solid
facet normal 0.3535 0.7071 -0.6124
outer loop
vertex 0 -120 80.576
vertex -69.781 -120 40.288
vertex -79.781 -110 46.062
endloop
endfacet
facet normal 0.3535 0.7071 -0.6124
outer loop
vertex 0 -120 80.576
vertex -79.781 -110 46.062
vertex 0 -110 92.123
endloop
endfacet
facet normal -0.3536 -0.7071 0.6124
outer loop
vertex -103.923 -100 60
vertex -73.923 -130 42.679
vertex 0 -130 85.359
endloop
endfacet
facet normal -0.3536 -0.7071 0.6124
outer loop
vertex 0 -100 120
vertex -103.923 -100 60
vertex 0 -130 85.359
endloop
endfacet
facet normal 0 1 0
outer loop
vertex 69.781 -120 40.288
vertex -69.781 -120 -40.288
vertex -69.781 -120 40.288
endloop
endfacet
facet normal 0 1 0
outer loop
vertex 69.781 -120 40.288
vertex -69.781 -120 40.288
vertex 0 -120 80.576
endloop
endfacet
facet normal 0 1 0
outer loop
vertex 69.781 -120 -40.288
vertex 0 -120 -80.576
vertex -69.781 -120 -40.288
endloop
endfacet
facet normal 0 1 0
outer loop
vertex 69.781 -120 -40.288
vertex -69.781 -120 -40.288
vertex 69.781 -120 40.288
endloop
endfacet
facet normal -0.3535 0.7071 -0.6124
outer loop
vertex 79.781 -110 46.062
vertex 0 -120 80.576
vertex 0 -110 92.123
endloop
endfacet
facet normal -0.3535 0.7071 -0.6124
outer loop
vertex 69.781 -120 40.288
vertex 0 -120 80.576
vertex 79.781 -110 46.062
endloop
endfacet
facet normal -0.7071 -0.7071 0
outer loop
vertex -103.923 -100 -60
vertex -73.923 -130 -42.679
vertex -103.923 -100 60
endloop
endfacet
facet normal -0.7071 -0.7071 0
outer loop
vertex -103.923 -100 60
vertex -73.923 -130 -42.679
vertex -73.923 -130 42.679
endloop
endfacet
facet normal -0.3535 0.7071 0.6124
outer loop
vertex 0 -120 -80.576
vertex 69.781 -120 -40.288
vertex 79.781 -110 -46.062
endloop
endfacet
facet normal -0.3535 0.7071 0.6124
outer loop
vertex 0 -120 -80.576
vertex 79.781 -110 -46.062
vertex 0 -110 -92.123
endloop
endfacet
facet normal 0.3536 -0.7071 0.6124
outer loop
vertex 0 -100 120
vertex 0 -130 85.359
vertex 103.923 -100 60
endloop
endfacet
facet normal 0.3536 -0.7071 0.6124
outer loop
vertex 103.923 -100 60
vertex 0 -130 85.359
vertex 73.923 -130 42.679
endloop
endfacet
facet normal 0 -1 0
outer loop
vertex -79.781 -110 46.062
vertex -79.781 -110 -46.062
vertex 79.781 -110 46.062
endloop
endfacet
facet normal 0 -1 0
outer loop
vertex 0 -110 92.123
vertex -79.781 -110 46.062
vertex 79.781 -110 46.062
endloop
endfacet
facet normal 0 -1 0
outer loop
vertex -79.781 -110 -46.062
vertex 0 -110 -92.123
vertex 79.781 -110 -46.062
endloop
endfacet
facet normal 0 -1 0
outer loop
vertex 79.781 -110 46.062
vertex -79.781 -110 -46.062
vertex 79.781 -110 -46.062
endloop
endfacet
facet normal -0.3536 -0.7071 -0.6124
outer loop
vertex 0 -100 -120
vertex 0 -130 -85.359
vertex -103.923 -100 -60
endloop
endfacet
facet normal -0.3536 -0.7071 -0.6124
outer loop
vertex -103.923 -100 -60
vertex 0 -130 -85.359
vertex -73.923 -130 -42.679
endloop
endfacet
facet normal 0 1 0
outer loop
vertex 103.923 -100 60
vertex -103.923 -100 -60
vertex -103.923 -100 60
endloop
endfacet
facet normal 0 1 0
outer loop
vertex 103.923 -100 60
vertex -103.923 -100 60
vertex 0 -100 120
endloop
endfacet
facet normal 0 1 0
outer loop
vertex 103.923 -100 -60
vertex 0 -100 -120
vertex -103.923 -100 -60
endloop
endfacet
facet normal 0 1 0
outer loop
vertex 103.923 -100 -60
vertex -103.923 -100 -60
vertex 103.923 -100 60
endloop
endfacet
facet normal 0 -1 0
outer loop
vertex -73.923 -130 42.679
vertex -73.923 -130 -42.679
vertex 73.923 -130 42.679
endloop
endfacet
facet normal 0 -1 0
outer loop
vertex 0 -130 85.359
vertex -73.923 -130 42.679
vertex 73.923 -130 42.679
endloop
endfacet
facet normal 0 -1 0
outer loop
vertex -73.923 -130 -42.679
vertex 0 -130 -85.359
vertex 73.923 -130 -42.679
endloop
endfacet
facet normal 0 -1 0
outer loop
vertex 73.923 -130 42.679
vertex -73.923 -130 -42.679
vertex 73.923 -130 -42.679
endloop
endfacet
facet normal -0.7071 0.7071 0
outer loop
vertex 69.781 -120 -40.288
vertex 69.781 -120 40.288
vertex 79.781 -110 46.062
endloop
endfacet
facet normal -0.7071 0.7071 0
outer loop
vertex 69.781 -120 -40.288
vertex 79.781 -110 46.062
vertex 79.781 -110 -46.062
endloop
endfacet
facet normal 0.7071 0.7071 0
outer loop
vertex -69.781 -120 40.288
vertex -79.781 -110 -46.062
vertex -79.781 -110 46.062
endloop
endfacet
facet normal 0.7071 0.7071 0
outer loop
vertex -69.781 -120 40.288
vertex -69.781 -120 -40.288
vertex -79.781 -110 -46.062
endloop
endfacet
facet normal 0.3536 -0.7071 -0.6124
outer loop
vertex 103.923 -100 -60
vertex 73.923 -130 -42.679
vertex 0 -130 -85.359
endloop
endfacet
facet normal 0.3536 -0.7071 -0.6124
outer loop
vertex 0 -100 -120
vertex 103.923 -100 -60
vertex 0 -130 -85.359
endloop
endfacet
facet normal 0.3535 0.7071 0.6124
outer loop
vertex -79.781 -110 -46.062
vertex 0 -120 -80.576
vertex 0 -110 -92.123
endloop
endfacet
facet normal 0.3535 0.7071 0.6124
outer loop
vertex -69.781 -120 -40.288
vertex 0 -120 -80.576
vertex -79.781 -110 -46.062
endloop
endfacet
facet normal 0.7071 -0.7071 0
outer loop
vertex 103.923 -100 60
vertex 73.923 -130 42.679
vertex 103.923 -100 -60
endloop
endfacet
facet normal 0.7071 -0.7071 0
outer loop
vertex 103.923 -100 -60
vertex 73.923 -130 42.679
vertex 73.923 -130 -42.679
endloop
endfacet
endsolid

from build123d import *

# Parameters (mm, degrees)
RESSALTO_EXTRUS_O1_DEPTH = 130
CHANFRO1_SIZE            = 30
CORTE_EXTRUS_O1_DEPTH    = 50
ESBO_O5_R                = 15
CORTE_EXTRUS_O2_DEPTH    = 293.06163733
CASCA1_T                 = 10


with BuildPart() as part:
    # Esboço1 → Ressalto-extrusão1 (new body)
    with BuildSketch(Plane(origin=(0, 0, 0), x_dir=(1, 0, 0), z_dir=(0, 1, 0))):
        Polygon((0, 120), (-103.923048454, 60), (-103.923048454, -60), (0, -120), (103.923048454, -60), (103.923048454, 60), align=None)
    extrude(amount=-RESSALTO_EXTRUS_O1_DEPTH)

    # Chanfro1
    chanfro1_edges = [part.edges().sort_by_distance(p)[0] for p in [
        (-103.923048454, -130, 0),
        (-51.961524227, -130, 90),
        (51.961524227, -130, 90),
        (103.923048454, -130, 0),
        (51.961524227, -130, -90),
        (-51.961524227, -130, -90),
    ]]
    chamfer(chanfro1_edges, length=CHANFRO1_SIZE)

    # Esboço2 → Corte-extrusão1 (cut)
    with BuildSketch(Plane(origin=(0, 0, 0), x_dir=(1, 0, 0), z_dir=(0, 1, 0))):
        Polygon((0, 108.452994616), (-93.923048454, 54.226497308), (-93.923048454, -54.226497308), (0, -108.452994616), (93.923048454, -54.226497308), (93.923048454, 54.226497308), align=None)
    extrude(amount=-CORTE_EXTRUS_O1_DEPTH, mode=Mode.SUBTRACT)

    # Esboço5 → Corte-extrusão2 (cut, through all)
    with BuildSketch(Plane(origin=(-51.961524227, 0, 90), x_dir=(0.8660254037844417, 0, 0.49999999999999495), z_dir=(-0.49999999999999495, 0, 0.8660254037844417))):
        with Locations((0, -30)):
            Circle(ESBO_O5_R)
    extrude(amount=-CORTE_EXTRUS_O2_DEPTH, mode=Mode.SUBTRACT)

    # Corte de superfície1
    split(bisect_by=Plane(origin=(0, -50, 0), x_dir=(1, 0, 0), z_dir=(0, 1, 0)), keep=Keep.BOTTOM)

    # Corte de superfície2
    split(bisect_by=Plane(origin=(0, -100, 0), x_dir=(1, 0, 0), z_dir=(0, 1, 0)), keep=Keep.BOTTOM)

    # Casca1 (no face opened: a closed hollow body)
    add(offset(amount=-CASCA1_T, mode=Mode.PRIVATE), mode=Mode.SUBTRACT)


solid = part.part
